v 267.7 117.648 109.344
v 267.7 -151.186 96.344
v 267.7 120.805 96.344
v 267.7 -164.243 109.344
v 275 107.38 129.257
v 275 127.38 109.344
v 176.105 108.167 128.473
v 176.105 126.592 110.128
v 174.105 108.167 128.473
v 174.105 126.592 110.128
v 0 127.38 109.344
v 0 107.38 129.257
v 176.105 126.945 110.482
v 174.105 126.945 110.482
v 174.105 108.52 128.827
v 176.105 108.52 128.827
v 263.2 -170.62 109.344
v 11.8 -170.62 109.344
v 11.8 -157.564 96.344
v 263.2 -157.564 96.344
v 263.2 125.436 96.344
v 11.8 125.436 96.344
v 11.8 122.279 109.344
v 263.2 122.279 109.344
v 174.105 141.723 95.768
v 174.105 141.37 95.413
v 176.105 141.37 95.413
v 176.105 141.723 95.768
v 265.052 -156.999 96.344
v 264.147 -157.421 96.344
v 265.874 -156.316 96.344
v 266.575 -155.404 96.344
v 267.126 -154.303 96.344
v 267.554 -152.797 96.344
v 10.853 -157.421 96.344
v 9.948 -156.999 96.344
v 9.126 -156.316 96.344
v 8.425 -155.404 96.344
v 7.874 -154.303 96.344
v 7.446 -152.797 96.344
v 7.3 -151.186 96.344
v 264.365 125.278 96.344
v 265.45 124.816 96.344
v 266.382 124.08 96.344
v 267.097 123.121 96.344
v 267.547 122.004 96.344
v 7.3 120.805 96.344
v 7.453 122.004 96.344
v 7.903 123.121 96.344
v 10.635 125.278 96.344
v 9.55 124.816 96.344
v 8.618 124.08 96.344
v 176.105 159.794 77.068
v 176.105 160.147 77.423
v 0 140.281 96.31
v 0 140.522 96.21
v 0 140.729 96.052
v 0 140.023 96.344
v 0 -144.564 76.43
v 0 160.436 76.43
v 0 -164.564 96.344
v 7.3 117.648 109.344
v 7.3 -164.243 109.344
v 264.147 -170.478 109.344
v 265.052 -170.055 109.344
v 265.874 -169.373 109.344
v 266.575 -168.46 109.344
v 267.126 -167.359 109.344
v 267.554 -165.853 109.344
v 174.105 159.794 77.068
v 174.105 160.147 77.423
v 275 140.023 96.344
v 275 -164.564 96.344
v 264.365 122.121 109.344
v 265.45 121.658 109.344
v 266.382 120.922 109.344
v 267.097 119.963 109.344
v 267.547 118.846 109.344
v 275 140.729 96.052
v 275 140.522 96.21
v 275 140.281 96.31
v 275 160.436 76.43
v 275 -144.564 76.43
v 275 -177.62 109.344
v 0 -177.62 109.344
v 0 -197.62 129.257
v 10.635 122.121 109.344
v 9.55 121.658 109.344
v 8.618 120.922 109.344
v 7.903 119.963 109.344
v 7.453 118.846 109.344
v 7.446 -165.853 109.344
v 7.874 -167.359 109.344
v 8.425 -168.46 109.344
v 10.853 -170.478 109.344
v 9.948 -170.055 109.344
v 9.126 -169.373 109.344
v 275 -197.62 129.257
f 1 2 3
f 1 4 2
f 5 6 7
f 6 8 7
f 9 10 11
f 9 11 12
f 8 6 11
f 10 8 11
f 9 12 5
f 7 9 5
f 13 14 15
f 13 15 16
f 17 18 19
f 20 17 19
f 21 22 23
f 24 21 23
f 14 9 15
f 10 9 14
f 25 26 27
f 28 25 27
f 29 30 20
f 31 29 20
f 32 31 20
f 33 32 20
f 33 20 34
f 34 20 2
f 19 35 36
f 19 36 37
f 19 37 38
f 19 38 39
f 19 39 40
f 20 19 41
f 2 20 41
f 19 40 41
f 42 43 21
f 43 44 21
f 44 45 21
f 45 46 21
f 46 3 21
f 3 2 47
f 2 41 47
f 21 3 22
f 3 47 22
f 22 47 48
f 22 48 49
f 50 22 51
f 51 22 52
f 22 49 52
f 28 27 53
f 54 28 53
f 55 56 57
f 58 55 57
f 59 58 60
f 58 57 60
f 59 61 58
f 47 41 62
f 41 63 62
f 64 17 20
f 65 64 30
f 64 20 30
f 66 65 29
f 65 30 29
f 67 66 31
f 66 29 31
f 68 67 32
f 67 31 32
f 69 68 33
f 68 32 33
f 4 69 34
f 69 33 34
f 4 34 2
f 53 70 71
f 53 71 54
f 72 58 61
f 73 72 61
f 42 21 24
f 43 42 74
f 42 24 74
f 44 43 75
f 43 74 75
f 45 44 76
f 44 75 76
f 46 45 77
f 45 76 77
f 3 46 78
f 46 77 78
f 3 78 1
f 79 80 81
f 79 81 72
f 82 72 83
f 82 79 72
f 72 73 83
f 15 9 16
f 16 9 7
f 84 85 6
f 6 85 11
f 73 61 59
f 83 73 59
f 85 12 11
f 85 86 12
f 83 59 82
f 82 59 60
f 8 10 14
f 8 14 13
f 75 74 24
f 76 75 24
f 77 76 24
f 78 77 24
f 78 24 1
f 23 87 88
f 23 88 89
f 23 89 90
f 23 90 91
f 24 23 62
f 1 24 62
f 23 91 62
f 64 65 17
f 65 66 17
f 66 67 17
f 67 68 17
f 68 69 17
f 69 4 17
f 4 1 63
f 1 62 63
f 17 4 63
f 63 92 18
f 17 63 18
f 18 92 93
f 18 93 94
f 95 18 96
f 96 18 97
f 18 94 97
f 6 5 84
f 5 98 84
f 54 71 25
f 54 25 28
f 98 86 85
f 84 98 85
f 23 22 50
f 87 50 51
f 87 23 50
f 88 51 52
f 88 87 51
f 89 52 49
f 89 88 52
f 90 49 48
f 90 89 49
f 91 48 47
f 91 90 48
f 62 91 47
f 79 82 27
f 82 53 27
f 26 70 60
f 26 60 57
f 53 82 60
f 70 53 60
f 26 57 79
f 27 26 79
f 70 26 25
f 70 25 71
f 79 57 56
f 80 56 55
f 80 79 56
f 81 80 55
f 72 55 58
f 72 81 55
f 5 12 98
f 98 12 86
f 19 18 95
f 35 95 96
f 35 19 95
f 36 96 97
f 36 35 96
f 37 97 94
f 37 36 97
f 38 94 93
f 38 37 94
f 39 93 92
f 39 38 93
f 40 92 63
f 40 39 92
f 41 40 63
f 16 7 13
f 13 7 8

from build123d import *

# Parameters (mm, degrees)
F3_DEPTH  = 275
F4_START  = 7.3
F4_DEPTH  = 260.4
F5_DEPTH  = 275
F6_R      = 1
F7_R      = 4.5
F8_W      = 2
F8_H      = 26
F9_DEPTH  = 0.5
F11_W     = 2
F11_H     = 26
F12_DEPTH = 0.5


with BuildPart() as f3:
    # F0 (on Right) → F3 (new body)
    with BuildSketch(Plane.YZ):
        Polygon((-164.5640683174, 96.3435024023), (-144.5640683174, 76.4297415474), (160.4359316826, 76.4297415474), (140.4359316826, 96.3435024023), align=None)
    extrude(amount=F3_DEPTH)

    # F6
    f6_edges = [f3.edges().sort_by_distance(p)[0] for p in [
        (137.5, 140.435932, 96.343502),
    ]]
    fillet(f6_edges, radius=F6_R)

    # F11 (on face) → F12 (join)
    with BuildSketch(Plane(origin=(0, 118.0858376375, 118.5972237972), x_dir=(1, 0, 0), z_dir=(0, 0.7055773332, 0.7086329281))):
        with Locations((175.10542, 45.8578866332)):
            Rectangle(F11_W, F11_H)
    extrude(amount=F12_DEPTH)


with BuildPart() as f4:
    # F1 (on Right) → F4 (new body)
    with BuildSketch(Plane.YZ.offset(F4_START)):
        Polygon((-170.6203665172, 109.3435024023), (-157.5640683174, 96.3435024023), (125.4359316826, 96.3435024023), (122.2785264254, 109.3435024023), align=None)
    extrude(amount=F4_DEPTH)

    # F7
    f7_edges = [f4.edges().sort_by_distance(p)[0] for p in [
        (267.7, 123.857229, 102.843502),
        (7.3, 123.857229, 102.843502),
        (267.7, -164.092217, 102.843502),
        (7.3, -164.092217, 102.843502),
    ]]
    fillet(f7_edges, radius=F7_R)


with BuildPart() as f5:
    # F2 (on Right) → F5 (new body)
    with BuildSketch(Plane.YZ):
        Polygon((-197.6203687556, 129.257265486), (-177.6203665172, 109.3435024023), (127.3796334828, 109.3435024023), (107.3796312444, 129.257265486), align=None)
    extrude(amount=F5_DEPTH)

    # F8 (on face) → F9 (join)
    with BuildSketch(Plane(origin=(0, 118.0858376375, 118.5972237972), x_dir=(1, 0, 0), z_dir=(0, 0.7055773332, 0.7086329281))):
        with Locations((175.1054227352, -0.9965741724)):
            Rectangle(F8_W, F8_H)
    extrude(amount=F9_DEPTH)


solid = Compound([f3.part, f4.part, f5.part])
